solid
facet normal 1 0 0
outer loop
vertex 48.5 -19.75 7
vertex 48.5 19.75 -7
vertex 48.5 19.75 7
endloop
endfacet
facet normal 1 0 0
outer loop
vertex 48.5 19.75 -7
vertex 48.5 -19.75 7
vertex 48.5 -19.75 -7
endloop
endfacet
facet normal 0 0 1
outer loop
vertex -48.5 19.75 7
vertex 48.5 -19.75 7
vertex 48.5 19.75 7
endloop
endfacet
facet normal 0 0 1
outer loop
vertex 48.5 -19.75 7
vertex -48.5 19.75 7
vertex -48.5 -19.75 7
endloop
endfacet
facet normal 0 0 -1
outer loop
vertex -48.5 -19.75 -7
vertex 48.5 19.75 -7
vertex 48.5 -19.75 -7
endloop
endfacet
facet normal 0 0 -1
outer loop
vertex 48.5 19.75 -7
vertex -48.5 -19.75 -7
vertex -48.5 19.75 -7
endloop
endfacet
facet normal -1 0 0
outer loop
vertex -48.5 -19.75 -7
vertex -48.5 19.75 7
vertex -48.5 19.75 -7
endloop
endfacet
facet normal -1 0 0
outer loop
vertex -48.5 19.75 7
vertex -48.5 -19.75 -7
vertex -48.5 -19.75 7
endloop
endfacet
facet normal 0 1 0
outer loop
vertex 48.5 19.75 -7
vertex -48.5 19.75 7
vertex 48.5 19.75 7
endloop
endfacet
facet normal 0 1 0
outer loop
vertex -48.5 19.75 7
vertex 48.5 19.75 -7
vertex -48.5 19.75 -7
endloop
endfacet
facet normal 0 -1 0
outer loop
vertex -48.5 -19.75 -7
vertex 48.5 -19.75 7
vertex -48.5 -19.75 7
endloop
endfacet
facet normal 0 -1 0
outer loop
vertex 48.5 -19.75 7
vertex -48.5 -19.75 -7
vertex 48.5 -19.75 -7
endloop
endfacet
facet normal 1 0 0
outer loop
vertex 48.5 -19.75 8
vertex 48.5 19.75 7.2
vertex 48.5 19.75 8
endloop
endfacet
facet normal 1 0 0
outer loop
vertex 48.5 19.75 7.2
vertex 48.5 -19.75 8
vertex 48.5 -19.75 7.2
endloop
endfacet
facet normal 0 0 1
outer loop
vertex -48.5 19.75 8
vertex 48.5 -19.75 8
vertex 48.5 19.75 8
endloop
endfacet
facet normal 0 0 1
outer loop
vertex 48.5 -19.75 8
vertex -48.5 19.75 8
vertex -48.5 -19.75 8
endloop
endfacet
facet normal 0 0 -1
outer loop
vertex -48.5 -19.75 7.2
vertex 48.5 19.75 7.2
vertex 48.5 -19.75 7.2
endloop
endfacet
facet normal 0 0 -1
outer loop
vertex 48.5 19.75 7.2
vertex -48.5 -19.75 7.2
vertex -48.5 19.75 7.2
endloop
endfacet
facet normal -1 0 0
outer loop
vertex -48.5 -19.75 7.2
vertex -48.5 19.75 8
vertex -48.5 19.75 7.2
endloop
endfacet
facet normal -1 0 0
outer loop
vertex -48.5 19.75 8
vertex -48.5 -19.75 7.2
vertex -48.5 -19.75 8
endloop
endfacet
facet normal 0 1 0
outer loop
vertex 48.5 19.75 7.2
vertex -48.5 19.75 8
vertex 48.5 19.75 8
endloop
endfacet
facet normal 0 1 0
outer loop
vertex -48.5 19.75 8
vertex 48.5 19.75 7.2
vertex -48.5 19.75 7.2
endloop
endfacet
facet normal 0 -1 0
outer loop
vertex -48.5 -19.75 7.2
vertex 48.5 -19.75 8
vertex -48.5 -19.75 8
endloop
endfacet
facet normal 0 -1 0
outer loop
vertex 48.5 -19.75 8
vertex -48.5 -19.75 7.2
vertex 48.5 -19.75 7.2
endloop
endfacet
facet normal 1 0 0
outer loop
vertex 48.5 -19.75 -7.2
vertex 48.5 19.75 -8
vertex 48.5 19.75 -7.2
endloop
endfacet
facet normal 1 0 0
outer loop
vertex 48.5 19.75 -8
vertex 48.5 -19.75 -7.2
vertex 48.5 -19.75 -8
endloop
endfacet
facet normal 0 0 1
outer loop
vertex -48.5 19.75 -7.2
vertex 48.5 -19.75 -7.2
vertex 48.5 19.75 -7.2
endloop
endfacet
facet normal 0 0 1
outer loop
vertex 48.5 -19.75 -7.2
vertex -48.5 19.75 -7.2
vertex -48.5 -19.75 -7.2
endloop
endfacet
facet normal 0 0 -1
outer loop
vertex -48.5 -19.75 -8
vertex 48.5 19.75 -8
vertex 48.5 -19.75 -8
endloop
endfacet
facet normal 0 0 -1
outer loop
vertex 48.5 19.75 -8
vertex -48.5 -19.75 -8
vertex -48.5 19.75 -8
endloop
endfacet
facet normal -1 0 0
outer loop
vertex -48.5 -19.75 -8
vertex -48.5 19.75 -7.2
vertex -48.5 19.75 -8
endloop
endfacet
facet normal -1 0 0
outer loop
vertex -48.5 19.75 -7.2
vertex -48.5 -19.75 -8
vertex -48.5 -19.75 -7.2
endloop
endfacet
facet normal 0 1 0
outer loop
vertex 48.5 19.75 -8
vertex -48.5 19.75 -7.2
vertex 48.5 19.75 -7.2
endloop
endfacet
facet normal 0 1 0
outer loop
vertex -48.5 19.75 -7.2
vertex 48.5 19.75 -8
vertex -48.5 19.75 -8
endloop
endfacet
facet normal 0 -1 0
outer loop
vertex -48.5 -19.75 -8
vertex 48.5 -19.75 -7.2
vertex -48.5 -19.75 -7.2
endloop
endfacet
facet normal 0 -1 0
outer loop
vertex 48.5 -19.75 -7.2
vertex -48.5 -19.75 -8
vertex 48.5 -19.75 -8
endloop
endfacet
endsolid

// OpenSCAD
// Parameters
width_mm = 97; //[48.5:194:0.5]
height_mm = 39.5; //[19.75:79:0.5]
thickness_mm = 14; //[7:28:0.5]
plane_thickness_mm = 0.8; //[0.2:2:0.1]
overlap_mm = 1; //[0.5:2:0.1]
include_mounting_holes = 0; //[0:1:1]
hole_diameter_mm = 3.2; //[1.6:6.4:0.1]
hole_edge_margin_x_mm = 3.5; //[1.5:7:0.1]
hole_edge_margin_y_mm = 3.5; //[1.5:7:0.1]
hole_boss_height_mm = 2; //[1:6:0.5]
include_viewing_aperture = 0; //[0:1:1]
aperture_width_mm = 76; //[38:152:0.5]
aperture_height_mm = 25; //[12.5:50:0.5]
aperture_inset_z_mm = 0.2; //[0:2:0.1]
display_inset_from_front_mm = 1.5; //[0.5:5:0.1]
display_thickness_mm = 6; //[2:12:0.5]
display_width_mm = 80; //[40:160:0.5]
display_height_mm = 28; //[14:56:0.5]

// Display module - complete geometry
module display() {
  color([0.0, 0.4, 0.2]) {
    // Display body
    translate([0, 0, thickness_mm/2 - display_inset_from_front_mm - display_thickness_mm/2])
      cube([display_width_mm, display_height_mm, display_thickness_mm], center=true);
  }
}

// Mod - complete geometry
module mod() {
  color([0.85, 0.85, 0.8]) {
    // Main body
    cube([width_mm, height_mm, thickness_mm], center=true);
    
    // Front face plane
    translate([0, 0, thickness_mm/2 - plane_thickness_mm/2 + overlap_mm])
      cube([width_mm, height_mm, plane_thickness_mm], center=true);
    
    // Rear face plane
    translate([0, 0, -thickness_mm/2 + plane_thickness_mm/2 - overlap_mm])
      cube([width_mm, height_mm, plane_thickness_mm], center=true);
    
    // Optional mounting holes
    if (include_mounting_holes) {
      color("Silver") {
        translate([width_mm/2 - hole_edge_margin_x_mm, height_mm/2 - hole_edge_margin_y_mm, -thickness_mm/2 + hole_boss_height_mm/2 - overlap_mm])
          cylinder(r=hole_diameter_mm/2, h=hole_boss_height_mm, center=true);
        translate([-(width_mm/2 - hole_edge_margin_x_mm), height_mm/2 - hole_edge_margin_y_mm, -thickness_mm/2 + hole_boss_height_mm/2 - overlap_mm])
          cylinder(r=hole_diameter_mm/2, h=hole_boss_height_mm, center=true);
        translate([width_mm/2 - hole_edge_margin_x_mm, -(height_mm/2 - hole_edge_margin_y_mm), -thickness_mm/2 + hole_boss_height_mm/2 - overlap_mm])
          cylinder(r=hole_diameter_mm/2, h=hole_boss_height_mm, center=true);
        translate([-(width_mm/2 - hole_edge_margin_x_mm), -(height_mm/2 - hole_edge_margin_y_mm), -thickness_mm/2 + hole_boss_height_mm/2 - overlap_mm])
          cylinder(r=hole_diameter_mm/2, h=hole_boss_height_mm, center=true);
      }
    }
    
    // Optional viewing aperture
    if (include_viewing_aperture) {
      difference() {
        translate([0, 0, thickness_mm/2 - plane_thickness_mm/2 + overlap_mm])
          cube([width_mm, height_mm, plane_thickness_mm], center=true);
        translate([0, 0, thickness_mm/2 - plane_thickness_mm/2 + overlap_mm])
          cube([aperture_width_mm, aperture_height_mm, plane_thickness_mm + aperture_inset_z_mm + overlap_mm], center=true);
      }
    }
  }
}

// Assembly
module assembly() {
  display();
  mod();
}

assembly();
